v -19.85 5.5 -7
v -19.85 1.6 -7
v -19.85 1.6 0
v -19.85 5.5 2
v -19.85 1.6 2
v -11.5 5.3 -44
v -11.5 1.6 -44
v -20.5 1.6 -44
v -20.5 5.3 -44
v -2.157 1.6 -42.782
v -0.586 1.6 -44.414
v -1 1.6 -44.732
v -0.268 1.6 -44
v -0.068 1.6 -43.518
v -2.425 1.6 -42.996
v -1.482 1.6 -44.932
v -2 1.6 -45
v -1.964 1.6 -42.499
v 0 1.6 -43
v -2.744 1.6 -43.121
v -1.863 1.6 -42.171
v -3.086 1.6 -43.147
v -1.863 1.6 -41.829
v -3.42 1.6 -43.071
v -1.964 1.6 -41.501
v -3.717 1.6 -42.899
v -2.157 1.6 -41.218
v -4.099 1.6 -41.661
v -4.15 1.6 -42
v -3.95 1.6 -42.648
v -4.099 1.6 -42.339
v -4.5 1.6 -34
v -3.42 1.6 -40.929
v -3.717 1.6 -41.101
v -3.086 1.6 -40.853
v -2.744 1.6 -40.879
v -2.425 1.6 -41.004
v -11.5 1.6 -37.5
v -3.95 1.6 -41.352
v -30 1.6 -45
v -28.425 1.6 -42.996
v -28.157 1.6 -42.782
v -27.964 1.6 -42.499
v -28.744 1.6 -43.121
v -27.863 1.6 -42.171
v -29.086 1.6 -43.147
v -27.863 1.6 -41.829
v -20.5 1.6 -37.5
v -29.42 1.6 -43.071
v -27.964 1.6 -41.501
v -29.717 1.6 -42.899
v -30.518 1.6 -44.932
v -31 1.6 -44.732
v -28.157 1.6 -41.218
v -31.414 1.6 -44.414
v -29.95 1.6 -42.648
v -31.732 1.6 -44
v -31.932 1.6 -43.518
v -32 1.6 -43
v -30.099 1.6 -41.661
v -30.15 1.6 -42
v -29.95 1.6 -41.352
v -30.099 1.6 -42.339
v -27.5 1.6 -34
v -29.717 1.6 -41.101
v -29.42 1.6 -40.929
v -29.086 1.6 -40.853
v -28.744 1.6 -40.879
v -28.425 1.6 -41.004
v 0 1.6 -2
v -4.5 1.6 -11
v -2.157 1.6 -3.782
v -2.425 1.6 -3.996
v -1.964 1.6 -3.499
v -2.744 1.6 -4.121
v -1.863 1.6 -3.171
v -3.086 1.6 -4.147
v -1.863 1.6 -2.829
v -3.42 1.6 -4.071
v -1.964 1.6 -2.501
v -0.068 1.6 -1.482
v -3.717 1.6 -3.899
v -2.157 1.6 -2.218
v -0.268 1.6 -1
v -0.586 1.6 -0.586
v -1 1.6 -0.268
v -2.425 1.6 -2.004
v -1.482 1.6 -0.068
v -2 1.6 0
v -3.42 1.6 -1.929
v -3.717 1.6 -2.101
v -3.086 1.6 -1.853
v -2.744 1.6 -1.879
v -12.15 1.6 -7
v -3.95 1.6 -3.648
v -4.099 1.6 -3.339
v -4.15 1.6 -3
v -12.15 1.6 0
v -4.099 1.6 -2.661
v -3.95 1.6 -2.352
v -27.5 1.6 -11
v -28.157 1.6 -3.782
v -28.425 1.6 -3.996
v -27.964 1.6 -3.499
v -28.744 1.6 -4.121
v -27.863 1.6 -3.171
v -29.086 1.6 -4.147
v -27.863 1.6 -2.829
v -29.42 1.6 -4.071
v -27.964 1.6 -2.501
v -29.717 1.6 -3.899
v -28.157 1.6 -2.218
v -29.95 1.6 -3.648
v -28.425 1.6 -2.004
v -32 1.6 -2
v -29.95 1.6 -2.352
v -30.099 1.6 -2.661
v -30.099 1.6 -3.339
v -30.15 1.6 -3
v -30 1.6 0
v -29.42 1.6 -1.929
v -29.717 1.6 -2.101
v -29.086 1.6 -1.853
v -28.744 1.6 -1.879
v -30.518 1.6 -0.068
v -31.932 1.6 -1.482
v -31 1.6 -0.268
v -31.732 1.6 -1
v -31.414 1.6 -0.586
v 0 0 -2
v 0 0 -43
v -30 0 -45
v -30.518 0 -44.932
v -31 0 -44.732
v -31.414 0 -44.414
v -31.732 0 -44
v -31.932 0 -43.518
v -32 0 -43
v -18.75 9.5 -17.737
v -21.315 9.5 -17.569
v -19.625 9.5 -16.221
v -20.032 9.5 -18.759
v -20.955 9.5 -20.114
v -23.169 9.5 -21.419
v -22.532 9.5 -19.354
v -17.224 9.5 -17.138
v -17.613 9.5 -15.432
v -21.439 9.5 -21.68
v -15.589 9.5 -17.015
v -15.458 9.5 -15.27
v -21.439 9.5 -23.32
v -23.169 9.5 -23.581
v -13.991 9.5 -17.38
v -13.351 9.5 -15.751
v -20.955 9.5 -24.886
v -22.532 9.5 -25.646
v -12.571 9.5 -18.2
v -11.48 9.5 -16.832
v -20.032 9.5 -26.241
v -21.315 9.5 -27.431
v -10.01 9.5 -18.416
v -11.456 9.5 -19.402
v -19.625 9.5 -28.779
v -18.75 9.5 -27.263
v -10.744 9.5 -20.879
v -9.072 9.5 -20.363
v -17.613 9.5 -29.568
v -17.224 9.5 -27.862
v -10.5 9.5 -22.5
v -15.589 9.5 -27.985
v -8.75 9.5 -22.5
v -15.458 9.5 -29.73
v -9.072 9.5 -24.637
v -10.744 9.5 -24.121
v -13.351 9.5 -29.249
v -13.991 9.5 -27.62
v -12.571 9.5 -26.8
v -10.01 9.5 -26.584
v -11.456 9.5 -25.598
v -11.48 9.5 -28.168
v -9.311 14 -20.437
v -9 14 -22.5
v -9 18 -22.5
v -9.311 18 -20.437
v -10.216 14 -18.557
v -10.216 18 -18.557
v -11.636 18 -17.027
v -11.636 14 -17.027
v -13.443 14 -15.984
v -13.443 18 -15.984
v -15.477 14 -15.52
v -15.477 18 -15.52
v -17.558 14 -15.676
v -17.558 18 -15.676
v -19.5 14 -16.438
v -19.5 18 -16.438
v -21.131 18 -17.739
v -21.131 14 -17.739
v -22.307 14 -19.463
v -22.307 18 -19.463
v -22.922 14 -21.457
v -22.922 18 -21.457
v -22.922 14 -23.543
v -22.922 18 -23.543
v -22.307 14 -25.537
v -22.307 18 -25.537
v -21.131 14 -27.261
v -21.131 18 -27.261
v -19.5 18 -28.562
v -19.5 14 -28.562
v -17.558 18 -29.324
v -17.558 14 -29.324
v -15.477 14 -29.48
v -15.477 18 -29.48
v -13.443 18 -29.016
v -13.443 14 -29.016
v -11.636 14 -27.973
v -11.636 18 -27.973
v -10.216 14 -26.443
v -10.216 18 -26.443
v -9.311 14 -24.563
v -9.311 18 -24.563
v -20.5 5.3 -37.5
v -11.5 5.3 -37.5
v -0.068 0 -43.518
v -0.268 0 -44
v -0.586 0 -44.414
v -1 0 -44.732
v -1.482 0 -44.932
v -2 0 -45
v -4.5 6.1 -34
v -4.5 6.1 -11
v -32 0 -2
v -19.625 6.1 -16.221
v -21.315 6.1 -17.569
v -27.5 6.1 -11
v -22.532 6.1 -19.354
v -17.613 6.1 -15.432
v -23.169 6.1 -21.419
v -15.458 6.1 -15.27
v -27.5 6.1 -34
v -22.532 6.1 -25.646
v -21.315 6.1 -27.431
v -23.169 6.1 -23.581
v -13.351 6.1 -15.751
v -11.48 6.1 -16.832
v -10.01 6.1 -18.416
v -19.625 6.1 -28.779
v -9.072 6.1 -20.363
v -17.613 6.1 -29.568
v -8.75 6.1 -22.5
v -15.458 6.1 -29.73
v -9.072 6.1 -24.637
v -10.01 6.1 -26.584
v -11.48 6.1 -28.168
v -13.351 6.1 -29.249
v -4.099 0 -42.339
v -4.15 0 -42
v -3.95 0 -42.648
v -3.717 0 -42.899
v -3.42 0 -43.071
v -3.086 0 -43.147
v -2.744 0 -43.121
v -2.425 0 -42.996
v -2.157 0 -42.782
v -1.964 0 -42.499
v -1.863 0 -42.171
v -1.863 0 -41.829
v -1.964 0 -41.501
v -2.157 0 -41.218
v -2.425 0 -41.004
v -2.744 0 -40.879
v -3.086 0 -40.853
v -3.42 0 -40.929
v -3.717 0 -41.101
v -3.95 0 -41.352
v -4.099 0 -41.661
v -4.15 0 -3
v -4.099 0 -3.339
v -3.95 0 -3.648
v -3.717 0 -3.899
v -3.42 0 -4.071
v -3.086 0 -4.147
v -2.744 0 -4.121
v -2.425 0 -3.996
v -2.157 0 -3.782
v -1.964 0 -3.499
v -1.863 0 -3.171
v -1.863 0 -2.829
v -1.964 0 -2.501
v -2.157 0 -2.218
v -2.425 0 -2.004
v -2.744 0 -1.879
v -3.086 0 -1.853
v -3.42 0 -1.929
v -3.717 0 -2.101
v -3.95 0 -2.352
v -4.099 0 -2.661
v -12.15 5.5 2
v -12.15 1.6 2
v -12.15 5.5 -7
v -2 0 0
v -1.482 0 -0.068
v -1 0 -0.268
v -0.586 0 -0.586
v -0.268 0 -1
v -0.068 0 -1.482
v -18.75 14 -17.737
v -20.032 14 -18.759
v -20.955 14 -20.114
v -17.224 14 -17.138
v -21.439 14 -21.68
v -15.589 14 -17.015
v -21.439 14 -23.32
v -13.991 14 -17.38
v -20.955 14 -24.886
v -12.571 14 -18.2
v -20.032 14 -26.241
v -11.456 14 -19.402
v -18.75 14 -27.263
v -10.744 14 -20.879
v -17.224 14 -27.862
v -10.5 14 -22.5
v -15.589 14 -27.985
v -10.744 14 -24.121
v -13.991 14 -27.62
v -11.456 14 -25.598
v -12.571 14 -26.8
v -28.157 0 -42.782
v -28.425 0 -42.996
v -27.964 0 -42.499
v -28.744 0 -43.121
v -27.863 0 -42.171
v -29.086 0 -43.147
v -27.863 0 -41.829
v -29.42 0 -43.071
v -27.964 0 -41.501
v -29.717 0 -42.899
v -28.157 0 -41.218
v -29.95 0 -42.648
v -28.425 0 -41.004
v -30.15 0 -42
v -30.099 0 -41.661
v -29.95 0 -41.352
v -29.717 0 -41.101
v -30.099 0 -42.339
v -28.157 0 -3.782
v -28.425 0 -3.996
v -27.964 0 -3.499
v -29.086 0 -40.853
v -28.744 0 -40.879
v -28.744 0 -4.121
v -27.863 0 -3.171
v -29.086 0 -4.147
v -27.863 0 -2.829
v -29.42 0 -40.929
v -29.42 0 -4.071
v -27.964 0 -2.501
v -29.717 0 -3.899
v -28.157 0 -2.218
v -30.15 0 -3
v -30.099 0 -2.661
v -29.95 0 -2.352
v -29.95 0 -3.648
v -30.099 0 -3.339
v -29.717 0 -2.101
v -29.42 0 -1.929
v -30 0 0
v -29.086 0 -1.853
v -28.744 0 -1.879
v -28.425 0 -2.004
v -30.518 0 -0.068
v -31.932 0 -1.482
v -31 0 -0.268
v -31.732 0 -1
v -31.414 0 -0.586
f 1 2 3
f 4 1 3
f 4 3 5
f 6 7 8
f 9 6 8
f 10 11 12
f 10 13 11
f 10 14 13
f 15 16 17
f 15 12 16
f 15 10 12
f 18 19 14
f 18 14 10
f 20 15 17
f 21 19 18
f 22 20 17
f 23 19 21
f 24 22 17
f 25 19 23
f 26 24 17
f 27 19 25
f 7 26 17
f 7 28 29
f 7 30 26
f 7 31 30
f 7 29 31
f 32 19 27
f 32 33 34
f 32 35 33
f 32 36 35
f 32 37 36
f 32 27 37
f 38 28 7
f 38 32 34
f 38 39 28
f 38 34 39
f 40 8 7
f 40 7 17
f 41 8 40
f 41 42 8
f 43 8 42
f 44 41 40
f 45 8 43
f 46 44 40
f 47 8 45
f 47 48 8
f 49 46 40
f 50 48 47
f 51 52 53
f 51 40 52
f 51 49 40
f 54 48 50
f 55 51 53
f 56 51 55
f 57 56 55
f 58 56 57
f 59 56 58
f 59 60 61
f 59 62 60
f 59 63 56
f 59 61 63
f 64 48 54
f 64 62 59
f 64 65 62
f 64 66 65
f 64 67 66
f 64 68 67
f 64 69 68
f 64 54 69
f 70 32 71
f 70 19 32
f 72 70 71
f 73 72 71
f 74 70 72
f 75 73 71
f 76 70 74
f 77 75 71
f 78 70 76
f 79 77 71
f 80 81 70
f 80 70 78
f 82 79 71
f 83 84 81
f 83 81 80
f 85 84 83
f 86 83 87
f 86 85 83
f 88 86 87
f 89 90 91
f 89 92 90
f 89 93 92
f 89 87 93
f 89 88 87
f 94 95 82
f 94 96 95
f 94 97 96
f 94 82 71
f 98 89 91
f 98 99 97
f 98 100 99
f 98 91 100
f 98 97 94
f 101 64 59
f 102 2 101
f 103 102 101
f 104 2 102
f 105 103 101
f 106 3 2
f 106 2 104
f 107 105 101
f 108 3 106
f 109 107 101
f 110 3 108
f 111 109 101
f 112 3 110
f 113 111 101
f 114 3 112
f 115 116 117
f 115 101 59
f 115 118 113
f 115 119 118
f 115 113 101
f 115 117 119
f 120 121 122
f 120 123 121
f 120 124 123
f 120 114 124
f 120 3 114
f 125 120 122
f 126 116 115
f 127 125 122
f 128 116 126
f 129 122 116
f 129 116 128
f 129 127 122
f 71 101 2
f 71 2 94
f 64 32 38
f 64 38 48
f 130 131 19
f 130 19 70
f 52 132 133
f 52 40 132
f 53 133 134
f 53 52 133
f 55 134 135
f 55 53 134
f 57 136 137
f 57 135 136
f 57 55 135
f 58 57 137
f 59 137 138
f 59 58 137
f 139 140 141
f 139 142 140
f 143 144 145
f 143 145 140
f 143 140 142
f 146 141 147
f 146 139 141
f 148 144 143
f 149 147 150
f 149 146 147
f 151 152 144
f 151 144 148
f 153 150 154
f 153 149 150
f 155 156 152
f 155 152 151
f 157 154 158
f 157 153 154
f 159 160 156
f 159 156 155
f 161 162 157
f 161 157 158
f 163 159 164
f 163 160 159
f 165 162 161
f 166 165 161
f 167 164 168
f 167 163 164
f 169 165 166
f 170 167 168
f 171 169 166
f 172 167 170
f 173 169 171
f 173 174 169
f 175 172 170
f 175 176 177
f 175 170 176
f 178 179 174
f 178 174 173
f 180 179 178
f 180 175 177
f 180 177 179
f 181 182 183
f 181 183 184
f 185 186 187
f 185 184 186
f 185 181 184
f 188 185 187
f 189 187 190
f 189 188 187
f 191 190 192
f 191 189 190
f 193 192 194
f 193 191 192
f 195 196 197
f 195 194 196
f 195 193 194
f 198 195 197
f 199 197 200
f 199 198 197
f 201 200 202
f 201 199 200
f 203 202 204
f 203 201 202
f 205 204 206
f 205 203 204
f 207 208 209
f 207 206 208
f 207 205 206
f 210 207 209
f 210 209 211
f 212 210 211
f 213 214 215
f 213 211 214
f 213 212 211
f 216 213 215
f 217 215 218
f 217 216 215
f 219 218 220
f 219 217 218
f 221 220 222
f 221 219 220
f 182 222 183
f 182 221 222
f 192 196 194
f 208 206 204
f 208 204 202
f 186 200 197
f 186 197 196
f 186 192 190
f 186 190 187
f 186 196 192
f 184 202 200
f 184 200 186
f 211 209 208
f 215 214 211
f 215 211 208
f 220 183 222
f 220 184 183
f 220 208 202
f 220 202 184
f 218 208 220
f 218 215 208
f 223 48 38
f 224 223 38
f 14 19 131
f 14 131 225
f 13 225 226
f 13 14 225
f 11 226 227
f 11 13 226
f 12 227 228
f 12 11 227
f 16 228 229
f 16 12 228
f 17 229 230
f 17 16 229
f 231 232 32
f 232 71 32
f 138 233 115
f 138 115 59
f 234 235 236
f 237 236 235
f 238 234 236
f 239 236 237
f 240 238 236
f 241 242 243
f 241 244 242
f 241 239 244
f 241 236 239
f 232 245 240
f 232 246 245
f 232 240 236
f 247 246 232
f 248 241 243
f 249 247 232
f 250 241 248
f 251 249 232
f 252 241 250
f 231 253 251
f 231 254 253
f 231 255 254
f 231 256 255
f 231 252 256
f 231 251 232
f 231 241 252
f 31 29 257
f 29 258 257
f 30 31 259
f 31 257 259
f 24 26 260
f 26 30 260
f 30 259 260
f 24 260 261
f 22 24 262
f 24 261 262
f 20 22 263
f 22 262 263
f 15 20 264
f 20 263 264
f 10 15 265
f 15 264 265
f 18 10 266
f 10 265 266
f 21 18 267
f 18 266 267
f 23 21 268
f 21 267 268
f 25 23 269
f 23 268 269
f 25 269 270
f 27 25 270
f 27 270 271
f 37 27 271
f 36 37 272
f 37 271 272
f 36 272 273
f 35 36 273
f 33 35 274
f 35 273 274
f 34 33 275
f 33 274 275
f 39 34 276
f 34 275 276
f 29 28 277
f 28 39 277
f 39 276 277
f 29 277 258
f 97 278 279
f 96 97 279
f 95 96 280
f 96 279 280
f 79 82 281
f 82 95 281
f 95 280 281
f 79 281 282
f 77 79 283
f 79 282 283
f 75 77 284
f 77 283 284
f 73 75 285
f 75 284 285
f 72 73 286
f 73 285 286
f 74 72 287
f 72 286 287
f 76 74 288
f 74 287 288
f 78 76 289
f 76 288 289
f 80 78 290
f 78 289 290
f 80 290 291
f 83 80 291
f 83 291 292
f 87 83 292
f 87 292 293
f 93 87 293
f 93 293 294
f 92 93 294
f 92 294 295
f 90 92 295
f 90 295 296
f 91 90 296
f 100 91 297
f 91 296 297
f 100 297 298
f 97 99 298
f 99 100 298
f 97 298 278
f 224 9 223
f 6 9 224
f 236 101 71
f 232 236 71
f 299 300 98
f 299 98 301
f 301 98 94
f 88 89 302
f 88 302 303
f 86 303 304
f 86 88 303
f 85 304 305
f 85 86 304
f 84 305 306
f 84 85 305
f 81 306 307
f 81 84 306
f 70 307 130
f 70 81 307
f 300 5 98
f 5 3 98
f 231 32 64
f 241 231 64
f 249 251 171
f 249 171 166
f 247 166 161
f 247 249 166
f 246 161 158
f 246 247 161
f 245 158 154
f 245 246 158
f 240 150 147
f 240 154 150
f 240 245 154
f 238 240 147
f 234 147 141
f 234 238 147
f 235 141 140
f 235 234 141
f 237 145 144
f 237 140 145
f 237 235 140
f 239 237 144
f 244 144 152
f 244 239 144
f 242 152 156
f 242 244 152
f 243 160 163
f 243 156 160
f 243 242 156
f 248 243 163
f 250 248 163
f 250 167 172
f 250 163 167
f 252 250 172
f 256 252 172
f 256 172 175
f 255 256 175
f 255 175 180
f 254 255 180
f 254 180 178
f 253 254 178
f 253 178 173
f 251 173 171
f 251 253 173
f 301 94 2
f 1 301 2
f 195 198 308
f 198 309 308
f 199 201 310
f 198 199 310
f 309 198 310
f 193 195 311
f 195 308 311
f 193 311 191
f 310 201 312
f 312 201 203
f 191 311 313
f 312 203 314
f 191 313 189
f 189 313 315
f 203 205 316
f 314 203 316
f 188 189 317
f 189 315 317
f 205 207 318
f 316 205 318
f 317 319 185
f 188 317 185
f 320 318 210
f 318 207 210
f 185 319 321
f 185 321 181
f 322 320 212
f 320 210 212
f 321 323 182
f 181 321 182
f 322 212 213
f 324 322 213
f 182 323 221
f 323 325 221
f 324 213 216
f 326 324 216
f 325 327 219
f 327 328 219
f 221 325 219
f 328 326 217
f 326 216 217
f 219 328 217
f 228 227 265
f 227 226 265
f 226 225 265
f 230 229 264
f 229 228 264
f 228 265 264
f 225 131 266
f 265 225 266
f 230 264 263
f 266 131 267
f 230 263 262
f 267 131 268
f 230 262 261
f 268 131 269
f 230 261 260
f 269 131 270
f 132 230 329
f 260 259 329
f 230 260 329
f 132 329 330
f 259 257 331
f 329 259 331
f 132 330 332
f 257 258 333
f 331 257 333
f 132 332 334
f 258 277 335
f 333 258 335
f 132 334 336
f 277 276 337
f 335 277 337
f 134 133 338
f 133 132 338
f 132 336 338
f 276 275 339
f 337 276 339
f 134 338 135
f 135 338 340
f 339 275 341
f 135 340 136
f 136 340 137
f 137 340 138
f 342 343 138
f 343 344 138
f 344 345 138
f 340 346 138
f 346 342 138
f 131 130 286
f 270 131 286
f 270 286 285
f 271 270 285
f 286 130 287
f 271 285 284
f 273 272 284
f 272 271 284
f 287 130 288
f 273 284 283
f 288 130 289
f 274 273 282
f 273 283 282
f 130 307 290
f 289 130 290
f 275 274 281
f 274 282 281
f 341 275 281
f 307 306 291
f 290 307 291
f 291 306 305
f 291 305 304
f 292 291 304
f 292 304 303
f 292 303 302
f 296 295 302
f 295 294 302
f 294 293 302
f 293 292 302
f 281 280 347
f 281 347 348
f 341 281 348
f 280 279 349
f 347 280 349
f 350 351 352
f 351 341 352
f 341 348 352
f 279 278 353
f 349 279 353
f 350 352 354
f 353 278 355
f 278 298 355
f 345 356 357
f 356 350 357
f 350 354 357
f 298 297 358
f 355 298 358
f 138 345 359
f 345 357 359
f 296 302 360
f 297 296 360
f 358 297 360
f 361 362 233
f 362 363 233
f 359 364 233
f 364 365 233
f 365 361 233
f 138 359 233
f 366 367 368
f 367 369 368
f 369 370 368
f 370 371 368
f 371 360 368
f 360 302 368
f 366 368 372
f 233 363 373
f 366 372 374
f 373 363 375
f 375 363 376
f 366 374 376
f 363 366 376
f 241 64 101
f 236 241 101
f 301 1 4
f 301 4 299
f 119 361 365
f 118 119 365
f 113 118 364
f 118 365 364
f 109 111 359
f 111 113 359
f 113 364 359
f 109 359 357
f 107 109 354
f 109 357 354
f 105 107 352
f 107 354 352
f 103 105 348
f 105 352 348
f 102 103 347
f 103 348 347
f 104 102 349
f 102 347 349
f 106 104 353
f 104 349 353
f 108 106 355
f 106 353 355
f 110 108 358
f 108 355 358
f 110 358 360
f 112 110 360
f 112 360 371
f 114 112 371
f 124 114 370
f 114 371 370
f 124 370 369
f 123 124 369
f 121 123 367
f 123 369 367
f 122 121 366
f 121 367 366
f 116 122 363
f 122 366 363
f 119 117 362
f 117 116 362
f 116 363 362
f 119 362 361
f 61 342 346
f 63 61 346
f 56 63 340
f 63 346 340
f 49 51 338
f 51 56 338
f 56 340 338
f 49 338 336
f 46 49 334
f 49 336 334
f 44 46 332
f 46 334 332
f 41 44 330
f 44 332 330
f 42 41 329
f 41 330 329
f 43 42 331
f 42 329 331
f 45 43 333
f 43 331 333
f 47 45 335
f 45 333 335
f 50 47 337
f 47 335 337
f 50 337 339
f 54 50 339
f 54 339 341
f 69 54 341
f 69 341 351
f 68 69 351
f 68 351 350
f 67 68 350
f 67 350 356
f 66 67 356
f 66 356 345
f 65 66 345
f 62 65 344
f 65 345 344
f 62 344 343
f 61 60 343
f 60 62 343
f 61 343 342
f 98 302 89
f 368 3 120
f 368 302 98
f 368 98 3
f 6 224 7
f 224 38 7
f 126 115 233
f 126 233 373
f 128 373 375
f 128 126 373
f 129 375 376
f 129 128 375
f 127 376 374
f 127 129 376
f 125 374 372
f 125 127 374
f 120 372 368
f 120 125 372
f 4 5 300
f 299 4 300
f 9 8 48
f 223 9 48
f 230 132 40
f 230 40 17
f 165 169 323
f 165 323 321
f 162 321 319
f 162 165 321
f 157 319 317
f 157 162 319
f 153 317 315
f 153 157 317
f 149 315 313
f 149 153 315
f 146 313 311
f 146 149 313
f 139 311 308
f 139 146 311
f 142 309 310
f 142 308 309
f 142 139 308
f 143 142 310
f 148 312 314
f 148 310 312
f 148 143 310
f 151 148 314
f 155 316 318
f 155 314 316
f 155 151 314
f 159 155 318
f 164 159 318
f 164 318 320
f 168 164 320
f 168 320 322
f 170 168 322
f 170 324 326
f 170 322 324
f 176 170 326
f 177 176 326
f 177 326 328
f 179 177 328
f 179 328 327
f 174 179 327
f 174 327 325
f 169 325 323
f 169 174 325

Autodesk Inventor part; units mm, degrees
ref_plane "YZ Plane" through (0, 0, 0) normal (1, 0, 0) x (0, 1, 0)
ref_plane "XZ Plane" through (0, 0, 0) normal (0, 1, 0) x (-1, 0, 0)
ref_plane "XY Plane" through (0, 0, 0) normal (0, 0, 1) x (1, 0, 0)
sketch "スケッチ1" plane through (0, 0, 0) normal (0, 1, 0) x (-1, 0, 0)
  line L0 (0, 0) -> (32, 0)
  line L1 (32, 0) -> (32, -45)
  line L2 (32, -45) -> (0, -45)
  line L3 (0, -45) -> (0, 0)
  circle A0 centre (29, -3) radius 1.15
  circle A1 centre (29, -42) radius 1.15
  circle A2 centre (3, -3) radius 1.15
  circle A3 centre (3, -42) radius 1.15
  dimension "d0" = 45
  dimension "d1" = 32
  dimension "d2" = 2.3
  dimension "d3" = 2.3
  dimension "d4" = 2.3
  dimension "d5" = 2.3
  dimension "d16" = 39
  dimension "d17" = 26
  dimension "d18" = 3
  dimension "d19" = 3
  dimension "d20" = 26
  dimension "d21" = 39
extrude "押し出し1" add sketch "スケッチ1" along normal blind 1.6
sketch "スケッチ2" plane through (0, 1.6, 0) normal (0, 1, 0) x (1, 0, 0)
  line L0 (-20.5, 37.5) -> (-11.5, 37.5)
  line L1 (-11.5, 37.5) -> (-11.5, 44)
  line L2 (-11.5, 44) -> (-20.5, 44)
  line L3 (-20.5, 44) -> (-20.5, 37.5)
  line L4 (-19.85, -2) -> (-12.15, -2)
  line L5 (-12.15, -2) -> (-12.15, 7)
  line L6 (-12.15, 7) -> (-19.85, 7)
  line L7 (-19.85, 7) -> (-19.85, -2)
  line L8 (-27.5, 11) -> (-4.5, 11)
  line L9 (-4.5, 11) -> (-4.5, 34)
  line L10 (-4.5, 34) -> (-27.5, 34)
  line L11 (-27.5, 34) -> (-27.5, 11)
  line L12 (0, 45) -> (-32, 45) projected
  line L13 (-32, 0) -> (0, 0) projected
  line L14 (-16, 0) -> (-16, 45) construction
  line L15 (-1.3785, 22.5) -> (-33.3785, 22.5) construction
  line L16 (-32, 45) -> (-32, 0) projected
  dimension "d22" = 9
  dimension "d23" = 7.7
  dimension "d25" = 23
  dimension "d26" = 23
  dimension "d27" = 9
  dimension "d28" = 6.5
  dimension "d29" = 1
  dimension "d30" = 2
  dimension "d31" = 11.5
  dimension "d32" = 11.5
  dimension "d33" = 3.85
  dimension "d34" = 4.5
  dimension "d35" = 22.5
  dimension "d36" = 45
fillet "フィレット1" radius 2 4 edges at (-32, 0.8, -45) (0, 0.8, -45) (-32, 0.8, 0) (0, 0.8, 0)
extrude "押し出し2" add sketch "スケッチ2" along normal blind 3.9 contours L7 L13 L5 L4 | L7 L6 L5 L13
sketch "スケッチ3" plane through (0, 1.6, 0) normal (0, 1, 0) x (1, 0, 0)
  line L0 (-20.5, 37.5) -> (-11.5, 37.5)
  line L1 (-11.5, 37.5) -> (-11.5, 44)
  line L2 (-11.5, 44) -> (-20.5, 44)
  line L3 (-20.5, 44) -> (-20.5, 37.5)
  line L4 (-19.85, -2) -> (-12.15, -2)
  line L5 (-12.15, -2) -> (-12.15, 7)
  line L6 (-12.15, 7) -> (-19.85, 7)
  line L7 (-19.85, 7) -> (-19.85, -2)
  line L8 (-27.5, 11) -> (-4.5, 11)
  line L9 (-4.5, 11) -> (-4.5, 34)
  line L10 (-4.5, 34) -> (-27.5, 34)
  line L11 (-27.5, 34) -> (-27.5, 11)
  line L12 (0, 45) -> (-32, 45)
  line L13 (-32, 0) -> (0, 0)
  line L14 (-16, 0) -> (-16, 45) construction
  line L15 (-1.3785, 22.5) -> (-33.3785, 22.5) construction
  line L16 (-32, 45) -> (-32, 0)
  dimension "d39" = 9
  dimension "d40" = 7.7
  dimension "d41" = 23
  dimension "d42" = 23
  dimension "d43" = 9
  dimension "d44" = 6.5
  dimension "d45" = 1
  dimension "d46" = 2
  dimension "d47" = 11.5
  dimension "d48" = 11.5
  dimension "d49" = 3.85
  dimension "d50" = 4.5
  dimension "d51" = 22.5
  dimension "d52" = 45
extrude "押し出し3" add sketch "スケッチ3" along normal blind 3.7 contours L3 L2 L1 L0
sketch "スケッチ4" plane through (0, 1.6, 0) normal (0, 1, 0) x (1, 0, 0)
  line L0 (-20.5, 37.5) -> (-11.5, 37.5)
  line L1 (-11.5, 37.5) -> (-11.5, 44)
  line L2 (-11.5, 44) -> (-20.5, 44)
  line L3 (-20.5, 44) -> (-20.5, 37.5)
  line L4 (-19.85, -2) -> (-12.15, -2)
  line L5 (-12.15, -2) -> (-12.15, 7)
  line L6 (-12.15, 7) -> (-19.85, 7)
  line L7 (-19.85, 7) -> (-19.85, -2)
  line L8 (-27.5, 11) -> (-4.5, 11)
  line L9 (-4.5, 11) -> (-4.5, 34)
  line L10 (-4.5, 34) -> (-27.5, 34)
  line L11 (-27.5, 34) -> (-27.5, 11)
  line L12 (0, 45) -> (-32, 45)
  line L13 (-32, 0) -> (0, 0)
  line L14 (-16, 0) -> (-16, 45) construction
  line L15 (-1.3785, 22.5) -> (-33.3785, 22.5) construction
  line L16 (-32, 45) -> (-32, 0)
  dimension "d55" = 9
  dimension "d56" = 7.7
  dimension "d57" = 23
  dimension "d58" = 23
  dimension "d59" = 9
  dimension "d60" = 6.5
  dimension "d61" = 1
  dimension "d62" = 2
  dimension "d63" = 11.5
  dimension "d64" = 11.5
  dimension "d65" = 3.85
  dimension "d66" = 4.5
  dimension "d67" = 22.5
  dimension "d68" = 45
extrude "押し出し4" add sketch "スケッチ4" along normal blind 4.5 contours L11 L10 L9 L8
sketch "スケッチ5" plane through (0, 6.1, 0) normal (0, 1, 0) x (1, 0, 0)
  circle A0 centre (-16, 22.5) radius 7.25
  line L0 (0, 2) -> (0, 43) projected
  point P0 (0, 0)
  dimension "d71" = 14.5
  dimension "d72" = 22.5
  dimension "d73" = 16
extrude "押し出し5" add sketch "スケッチ5" along normal blind 3.4
sketch "スケッチ6" plane through (-16, 9.5, -22.5) normal (0, 1, 0) x (1, 0, 0)
  circle A0 centre (0, 0) radius 5.5
  circle A1 centre (0, 0) radius 7.25 projected
  point P0 (16, -22.5)
  dimension "d76" = 11
extrude "押し出し6" add sketch "スケッチ6" along normal blind 4.5 contours A0
sketch "スケッチ7" plane through (-16, 14, -22.5) normal (0, 1, 0) x (1, 0, 0)
  circle A0 centre (0, 0) radius 7
  circle A1 centre (0, 0) radius 5.5 projected
  point P0 (16, -22.5)
  dimension "d79" = 14
extrude "押し出し7" add sketch "スケッチ7" along normal blind 4 contours A0 | A1
equation "\"d3\" = d2"
equation "\"d4\" = d2"
equation "\"d5\" = d2"
equation "\"d20\" = d17"
equation "\"d21\" = d16"
equation "\"d31\" = 0.5 * d25"
equation "\"d32\" = 0.5 * d26"
equation "\"d33\" = 0.5 * d23"
equation "\"d34\" = 0.5 * d22"
equation "\"d35\" = 0.5 * d36"
equation "\"d47\" = 0.5 * d41"
equation "\"d48\" = 0.5 * d42"
equation "\"d49\" = 0.5 * d40"
equation "\"d50\" = 0.5 * d39"
equation "\"d51\" = 0.5 * d52"
equation "\"d63\" = 0.5 * d57"
equation "\"d64\" = 0.5 * d58"
equation "\"d65\" = 0.5 * d56"
equation "\"d66\" = 0.5 * d55"
equation "\"d67\" = 0.5 * d68"
properties part number "KCSU5380"
